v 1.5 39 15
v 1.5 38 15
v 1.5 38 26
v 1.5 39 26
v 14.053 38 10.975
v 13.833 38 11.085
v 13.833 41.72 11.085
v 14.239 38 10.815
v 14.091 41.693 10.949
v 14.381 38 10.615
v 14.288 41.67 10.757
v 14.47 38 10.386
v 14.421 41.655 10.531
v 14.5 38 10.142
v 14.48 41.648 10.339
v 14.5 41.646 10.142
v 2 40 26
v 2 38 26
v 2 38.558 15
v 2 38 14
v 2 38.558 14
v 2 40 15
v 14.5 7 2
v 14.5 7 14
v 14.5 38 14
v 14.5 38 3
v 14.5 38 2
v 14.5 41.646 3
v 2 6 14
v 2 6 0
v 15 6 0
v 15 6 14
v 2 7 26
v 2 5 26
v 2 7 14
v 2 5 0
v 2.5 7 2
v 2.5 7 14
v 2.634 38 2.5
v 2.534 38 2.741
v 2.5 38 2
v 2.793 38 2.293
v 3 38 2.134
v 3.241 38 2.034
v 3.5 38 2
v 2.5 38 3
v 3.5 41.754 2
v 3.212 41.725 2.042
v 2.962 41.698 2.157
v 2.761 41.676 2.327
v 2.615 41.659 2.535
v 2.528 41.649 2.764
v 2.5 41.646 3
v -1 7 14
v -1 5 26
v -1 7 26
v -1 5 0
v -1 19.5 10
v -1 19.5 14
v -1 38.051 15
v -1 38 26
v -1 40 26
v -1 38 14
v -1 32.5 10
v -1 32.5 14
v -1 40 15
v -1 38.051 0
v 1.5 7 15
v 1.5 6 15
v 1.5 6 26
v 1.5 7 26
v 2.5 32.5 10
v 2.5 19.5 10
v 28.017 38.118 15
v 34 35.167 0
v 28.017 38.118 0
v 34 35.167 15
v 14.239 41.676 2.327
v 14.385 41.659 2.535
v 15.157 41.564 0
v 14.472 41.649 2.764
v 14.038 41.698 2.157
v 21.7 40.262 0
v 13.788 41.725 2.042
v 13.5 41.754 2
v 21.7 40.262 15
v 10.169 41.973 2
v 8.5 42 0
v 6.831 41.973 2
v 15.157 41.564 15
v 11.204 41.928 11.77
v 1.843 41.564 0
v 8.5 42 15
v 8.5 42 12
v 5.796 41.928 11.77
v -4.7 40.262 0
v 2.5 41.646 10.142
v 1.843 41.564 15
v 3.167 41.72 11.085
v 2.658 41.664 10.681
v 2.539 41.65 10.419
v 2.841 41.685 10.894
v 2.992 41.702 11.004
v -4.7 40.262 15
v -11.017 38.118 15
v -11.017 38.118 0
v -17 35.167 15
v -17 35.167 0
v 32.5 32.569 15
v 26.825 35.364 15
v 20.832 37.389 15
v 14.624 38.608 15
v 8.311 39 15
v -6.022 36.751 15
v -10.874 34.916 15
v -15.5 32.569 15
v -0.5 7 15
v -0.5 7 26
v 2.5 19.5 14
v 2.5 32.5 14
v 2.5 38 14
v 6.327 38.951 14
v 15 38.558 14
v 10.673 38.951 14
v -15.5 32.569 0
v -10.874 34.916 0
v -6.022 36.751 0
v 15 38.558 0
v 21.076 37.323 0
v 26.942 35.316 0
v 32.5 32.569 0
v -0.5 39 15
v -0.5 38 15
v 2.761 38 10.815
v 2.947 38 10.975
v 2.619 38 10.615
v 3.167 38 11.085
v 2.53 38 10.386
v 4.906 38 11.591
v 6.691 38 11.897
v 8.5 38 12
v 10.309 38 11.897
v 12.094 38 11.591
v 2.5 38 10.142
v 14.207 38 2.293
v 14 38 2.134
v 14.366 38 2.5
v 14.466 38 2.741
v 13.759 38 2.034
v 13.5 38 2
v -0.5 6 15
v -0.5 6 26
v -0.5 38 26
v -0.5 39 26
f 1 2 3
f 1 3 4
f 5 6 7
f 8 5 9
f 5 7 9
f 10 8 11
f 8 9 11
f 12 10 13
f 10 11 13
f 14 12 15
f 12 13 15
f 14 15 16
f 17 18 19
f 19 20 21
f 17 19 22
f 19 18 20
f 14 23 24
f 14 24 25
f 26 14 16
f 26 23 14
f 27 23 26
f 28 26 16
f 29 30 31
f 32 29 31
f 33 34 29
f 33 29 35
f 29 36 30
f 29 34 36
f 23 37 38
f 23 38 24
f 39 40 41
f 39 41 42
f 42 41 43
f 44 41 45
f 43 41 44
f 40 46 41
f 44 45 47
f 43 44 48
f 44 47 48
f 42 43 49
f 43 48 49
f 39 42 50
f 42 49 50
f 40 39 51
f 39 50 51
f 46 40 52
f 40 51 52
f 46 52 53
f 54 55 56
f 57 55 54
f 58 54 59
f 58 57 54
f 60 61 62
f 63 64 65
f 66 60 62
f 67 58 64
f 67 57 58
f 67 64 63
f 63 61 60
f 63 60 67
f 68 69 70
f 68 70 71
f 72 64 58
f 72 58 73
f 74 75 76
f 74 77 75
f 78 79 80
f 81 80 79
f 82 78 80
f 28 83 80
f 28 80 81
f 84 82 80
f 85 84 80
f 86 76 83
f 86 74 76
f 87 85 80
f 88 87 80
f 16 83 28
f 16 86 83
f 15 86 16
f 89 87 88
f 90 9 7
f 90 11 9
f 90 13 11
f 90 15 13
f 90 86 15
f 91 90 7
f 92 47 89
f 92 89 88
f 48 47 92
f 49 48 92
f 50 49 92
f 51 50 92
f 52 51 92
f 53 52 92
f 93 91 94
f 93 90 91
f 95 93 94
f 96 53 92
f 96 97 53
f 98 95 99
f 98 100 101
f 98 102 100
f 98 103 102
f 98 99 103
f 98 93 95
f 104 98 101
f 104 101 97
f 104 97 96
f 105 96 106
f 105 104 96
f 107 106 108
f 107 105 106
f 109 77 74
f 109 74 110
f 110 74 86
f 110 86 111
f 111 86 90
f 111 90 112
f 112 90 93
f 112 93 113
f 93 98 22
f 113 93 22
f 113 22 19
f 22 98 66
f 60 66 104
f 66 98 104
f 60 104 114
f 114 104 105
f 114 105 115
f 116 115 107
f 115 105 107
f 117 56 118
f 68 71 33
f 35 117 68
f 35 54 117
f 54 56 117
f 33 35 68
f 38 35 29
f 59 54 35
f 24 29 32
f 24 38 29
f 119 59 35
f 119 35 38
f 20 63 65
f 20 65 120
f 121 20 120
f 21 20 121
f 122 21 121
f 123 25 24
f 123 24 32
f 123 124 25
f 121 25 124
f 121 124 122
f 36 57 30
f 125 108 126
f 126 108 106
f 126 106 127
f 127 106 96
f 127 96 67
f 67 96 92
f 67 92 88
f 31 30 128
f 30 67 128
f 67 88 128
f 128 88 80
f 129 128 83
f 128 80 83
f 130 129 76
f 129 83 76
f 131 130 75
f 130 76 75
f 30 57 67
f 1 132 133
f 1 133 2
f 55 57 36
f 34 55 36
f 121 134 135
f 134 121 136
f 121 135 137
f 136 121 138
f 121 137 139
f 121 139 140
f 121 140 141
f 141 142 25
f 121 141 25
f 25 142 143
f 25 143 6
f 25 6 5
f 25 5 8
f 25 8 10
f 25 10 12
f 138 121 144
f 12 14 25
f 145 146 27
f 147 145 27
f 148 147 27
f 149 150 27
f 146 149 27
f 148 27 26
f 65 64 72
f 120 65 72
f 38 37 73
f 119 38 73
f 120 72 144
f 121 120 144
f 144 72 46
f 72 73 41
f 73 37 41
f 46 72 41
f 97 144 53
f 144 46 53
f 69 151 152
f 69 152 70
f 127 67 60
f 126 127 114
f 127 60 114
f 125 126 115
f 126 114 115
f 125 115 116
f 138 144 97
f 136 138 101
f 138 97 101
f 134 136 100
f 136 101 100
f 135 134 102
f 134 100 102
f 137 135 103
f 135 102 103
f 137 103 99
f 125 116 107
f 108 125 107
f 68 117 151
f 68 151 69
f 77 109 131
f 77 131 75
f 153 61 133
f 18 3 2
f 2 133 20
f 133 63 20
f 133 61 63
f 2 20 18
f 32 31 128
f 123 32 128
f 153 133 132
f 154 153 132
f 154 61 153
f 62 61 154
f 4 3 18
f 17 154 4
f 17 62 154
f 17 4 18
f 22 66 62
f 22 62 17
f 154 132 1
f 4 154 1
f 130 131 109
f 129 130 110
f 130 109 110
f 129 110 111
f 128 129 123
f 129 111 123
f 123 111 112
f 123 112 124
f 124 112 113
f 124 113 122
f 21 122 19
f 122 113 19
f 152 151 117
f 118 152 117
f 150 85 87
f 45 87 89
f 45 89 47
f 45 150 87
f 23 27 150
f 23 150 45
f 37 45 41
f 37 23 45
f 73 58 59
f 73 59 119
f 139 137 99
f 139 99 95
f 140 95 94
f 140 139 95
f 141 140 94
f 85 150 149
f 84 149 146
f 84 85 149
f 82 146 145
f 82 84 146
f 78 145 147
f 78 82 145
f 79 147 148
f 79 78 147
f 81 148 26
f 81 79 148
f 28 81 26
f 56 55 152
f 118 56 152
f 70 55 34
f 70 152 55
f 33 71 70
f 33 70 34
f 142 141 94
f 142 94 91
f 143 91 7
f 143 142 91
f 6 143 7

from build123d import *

# Parameters (mm, degrees)
BOX005_W                    = 5
BOX005_H                    = 13
BOX005_DEPTH                = 4
BOX004_W                    = 3
BOX004_H                    = 31
BOX004_DEPTH                = 14
BOX003_W                    = 2
BOX003_H                    = 33
BOX003_DEPTH                = 11.2
BOX002_W                    = 3
BOX002_H                    = 35
BOX002_DEPTH                = 26
EXTRUDE_DEPTH               = 5
EXTRUDE001_DEPTH            = 5
THICKNESS_T                 = 1
BOX_W                       = 12
BOX_H                       = 31
BOX_DEPTH                   = 15
BOX001_W                    = 13
BOX001_H                    = 34
BOX001_DEPTH                = 14
CYLINDER001_W               = 48
CYLINDER001_H               = 15
CYLINDER001_ANGLE           = 60
CYLINDER001_PLACEMENT_ANGLE = 60
CYLINDER_W                  = 51
CYLINDER_H                  = 15
CYLINDER_ANGLE              = 60
CYLINDER_PLACEMENT_ANGLE    = 60


with BuildPart() as servo_wall_cutaway:
    # Box005 → Box005 (new body)
    with BuildSketch(Plane(origin=(-2, 19.5, 10), x_dir=(1, 0, 0), z_dir=(0, 0, 1))):
        with Locations((2.5, 6.5)):
            Rectangle(BOX005_W, BOX005_H)
    extrude(amount=BOX005_DEPTH)


with BuildPart() as slot_wall_cutout2:
    # Box004 → Box004 (new body)
    with BuildSketch(Plane(origin=(-1, 7, 14), x_dir=(1, 0, 0), z_dir=(0, 0, 1))):
        with Locations((1.5, 15.5)):
            Rectangle(BOX004_W, BOX004_H)
    extrude(amount=BOX004_DEPTH)


with BuildPart() as slot_wall_cutout1:
    # Box003 → Box003 (new body)
    with BuildSketch(Plane(origin=(-0.5, 6, 15), x_dir=(1, 0, 0), z_dir=(0, 0, 1))):
        with Locations((1, 16.5)):
            Rectangle(BOX003_W, BOX003_H)
    extrude(amount=BOX003_DEPTH)


with BuildPart() as wall_slot_finished:
    # Box002 → Box002 (new body)
    with BuildSketch(Plane(origin=(-1, 5, 0), x_dir=(1, 0, 0), z_dir=(0, 0, 1))):
        with Locations((1.5, 17.5)):
            Rectangle(BOX002_W, BOX002_H)
    extrude(amount=BOX002_DEPTH)

    # Cut003: cut slot wall cutout1
    add(slot_wall_cutout1.part, mode=Mode.SUBTRACT)

    # Cut004: cut slot wall cutout2
    add(slot_wall_cutout2.part, mode=Mode.SUBTRACT)


with BuildPart() as extrude_body:
    # Common_cs → Extrude (new body)
    with BuildSketch(Plane(origin=(8.5, 45, 6), x_dir=(1, 0, 0), z_dir=(0, 1, 0))):
        with BuildLine():
            Line((5, 4), (-5, 4))
            Line((-5, 4), (-5, -3.142136))
            ThreePointArc((-5, -3.142136), (-2.53653, -3.783978), (0, -4))
            ThreePointArc((0, -4), (2.53653, -3.783978), (5, -3.142136))
            Line((5, -3.142136), (5, 4))
        make_face()
    extrude(amount=EXTRUDE_DEPTH)


with BuildPart() as extrude001:
    # Common_cs001 → Extrude001 (new body)
    with BuildSketch(Plane(origin=(8.5, 45, 6), x_dir=(1, 0, 0), z_dir=(0, 1, 0))):
        with BuildLine():
            Line((5, 4), (-5, 4))
            Line((-5, 4), (-5, -3.142136))
            ThreePointArc((-5, -3.142136), (-2.53653, -3.783978), (0, -4))
            ThreePointArc((0, -4), (2.53653, -3.783978), (5, -3.142136))
            Line((5, -3.142136), (5, 4))
        make_face()
    extrude(amount=EXTRUDE001_DEPTH)


with BuildPart() as bolt_bottle_side_opening:
    # Thickness base: copy of Extrude body
    add(extrude_body.part)

    # Thickness
    thickness_openings = [bolt_bottle_side_opening.faces().sort_by_distance(p)[0] for p in [
        (8.5, 50, 5.862901),
    ]]
    offset(amount=THICKNESS_T, openings=thickness_openings)

    # Fusion: union Extrude body, Extrude001
    add(extrude_body.part)
    add(extrude001.part)


with BuildPart() as bolt_bottle_side_opening_1:
    # Fusion placement: moved
    add(bolt_bottle_side_opening.part.moved(Location((0, -7, 1))))


with BuildPart() as pullbay:
    # Box → Box (new body)
    with BuildSketch(Plane(origin=(2.5, 7, 2), x_dir=(1, 0, 0), z_dir=(0, 0, 1))):
        with Locations((6, 15.5)):
            Rectangle(BOX_W, BOX_H)
    extrude(amount=BOX_DEPTH)


with BuildPart() as cut_bay_from_case:
    # Box001 → Box001 (new body)
    with BuildSketch(Plane(origin=(2, 6, 0), x_dir=(1, 0, 0), z_dir=(0, 0, 1))):
        with Locations((6.5, 17)):
            Rectangle(BOX001_W, BOX001_H)
    extrude(amount=BOX001_DEPTH)

    # Cut001: cut pullBay
    add(pullbay.part, mode=Mode.SUBTRACT)


with BuildPart() as bottle_wall001:
    # Cylinder001 → Cylinder001 (revolve)
    with BuildSketch(Plane.XZ):
        with Locations((24, 7.5)):
            Rectangle(CYLINDER001_W, CYLINDER001_H)
    revolve(axis=Axis((0, 0, 0), (0, 0, 1)), revolution_arc=CYLINDER001_ANGLE)


with BuildPart() as bottle_wall001_1:
    # Cylinder001 placement: moved
    add(bottle_wall001.part.moved(Location((8.5, -7, 0))).rotate(Axis((8.5, -7, 0), (0, 0, 1)), CYLINDER001_PLACEMENT_ANGLE))


with BuildPart() as cut005:
    # Cylinder → Cylinder (revolve)
    with BuildSketch(Plane.XZ):
        with Locations((25.5, 7.5)):
            Rectangle(CYLINDER_W, CYLINDER_H)
    revolve(axis=Axis((0, 0, 0), (0, 0, 1)), revolution_arc=CYLINDER_ANGLE)


with BuildPart() as cut005_1:
    # Cylinder placement: moved
    add(cut005.part.moved(Location((8.5, -7, 0))).rotate(Axis((8.5, -7, 0), (0, 0, 1)), CYLINDER_PLACEMENT_ANGLE))

    # Cut: cut bottle_wall001
    add(bottle_wall001_1.part, mode=Mode.SUBTRACT)


with BuildPart() as cut005_2:
    # Cut placement: moved
    add(cut005_1.part.moved(Location((0, -2, 0))))

    # Fusion001: union cut bay from case
    add(cut_bay_from_case.part)

    # Cut002: cut bolt_bottle_side_opening
    add(bolt_bottle_side_opening_1.part, mode=Mode.SUBTRACT)

    # Fusion002: union wall slot finished
    add(wall_slot_finished.part)

    # Cut005: cut servo wall cutaway
    add(servo_wall_cutaway.part, mode=Mode.SUBTRACT)


solid = cut005_2.part
